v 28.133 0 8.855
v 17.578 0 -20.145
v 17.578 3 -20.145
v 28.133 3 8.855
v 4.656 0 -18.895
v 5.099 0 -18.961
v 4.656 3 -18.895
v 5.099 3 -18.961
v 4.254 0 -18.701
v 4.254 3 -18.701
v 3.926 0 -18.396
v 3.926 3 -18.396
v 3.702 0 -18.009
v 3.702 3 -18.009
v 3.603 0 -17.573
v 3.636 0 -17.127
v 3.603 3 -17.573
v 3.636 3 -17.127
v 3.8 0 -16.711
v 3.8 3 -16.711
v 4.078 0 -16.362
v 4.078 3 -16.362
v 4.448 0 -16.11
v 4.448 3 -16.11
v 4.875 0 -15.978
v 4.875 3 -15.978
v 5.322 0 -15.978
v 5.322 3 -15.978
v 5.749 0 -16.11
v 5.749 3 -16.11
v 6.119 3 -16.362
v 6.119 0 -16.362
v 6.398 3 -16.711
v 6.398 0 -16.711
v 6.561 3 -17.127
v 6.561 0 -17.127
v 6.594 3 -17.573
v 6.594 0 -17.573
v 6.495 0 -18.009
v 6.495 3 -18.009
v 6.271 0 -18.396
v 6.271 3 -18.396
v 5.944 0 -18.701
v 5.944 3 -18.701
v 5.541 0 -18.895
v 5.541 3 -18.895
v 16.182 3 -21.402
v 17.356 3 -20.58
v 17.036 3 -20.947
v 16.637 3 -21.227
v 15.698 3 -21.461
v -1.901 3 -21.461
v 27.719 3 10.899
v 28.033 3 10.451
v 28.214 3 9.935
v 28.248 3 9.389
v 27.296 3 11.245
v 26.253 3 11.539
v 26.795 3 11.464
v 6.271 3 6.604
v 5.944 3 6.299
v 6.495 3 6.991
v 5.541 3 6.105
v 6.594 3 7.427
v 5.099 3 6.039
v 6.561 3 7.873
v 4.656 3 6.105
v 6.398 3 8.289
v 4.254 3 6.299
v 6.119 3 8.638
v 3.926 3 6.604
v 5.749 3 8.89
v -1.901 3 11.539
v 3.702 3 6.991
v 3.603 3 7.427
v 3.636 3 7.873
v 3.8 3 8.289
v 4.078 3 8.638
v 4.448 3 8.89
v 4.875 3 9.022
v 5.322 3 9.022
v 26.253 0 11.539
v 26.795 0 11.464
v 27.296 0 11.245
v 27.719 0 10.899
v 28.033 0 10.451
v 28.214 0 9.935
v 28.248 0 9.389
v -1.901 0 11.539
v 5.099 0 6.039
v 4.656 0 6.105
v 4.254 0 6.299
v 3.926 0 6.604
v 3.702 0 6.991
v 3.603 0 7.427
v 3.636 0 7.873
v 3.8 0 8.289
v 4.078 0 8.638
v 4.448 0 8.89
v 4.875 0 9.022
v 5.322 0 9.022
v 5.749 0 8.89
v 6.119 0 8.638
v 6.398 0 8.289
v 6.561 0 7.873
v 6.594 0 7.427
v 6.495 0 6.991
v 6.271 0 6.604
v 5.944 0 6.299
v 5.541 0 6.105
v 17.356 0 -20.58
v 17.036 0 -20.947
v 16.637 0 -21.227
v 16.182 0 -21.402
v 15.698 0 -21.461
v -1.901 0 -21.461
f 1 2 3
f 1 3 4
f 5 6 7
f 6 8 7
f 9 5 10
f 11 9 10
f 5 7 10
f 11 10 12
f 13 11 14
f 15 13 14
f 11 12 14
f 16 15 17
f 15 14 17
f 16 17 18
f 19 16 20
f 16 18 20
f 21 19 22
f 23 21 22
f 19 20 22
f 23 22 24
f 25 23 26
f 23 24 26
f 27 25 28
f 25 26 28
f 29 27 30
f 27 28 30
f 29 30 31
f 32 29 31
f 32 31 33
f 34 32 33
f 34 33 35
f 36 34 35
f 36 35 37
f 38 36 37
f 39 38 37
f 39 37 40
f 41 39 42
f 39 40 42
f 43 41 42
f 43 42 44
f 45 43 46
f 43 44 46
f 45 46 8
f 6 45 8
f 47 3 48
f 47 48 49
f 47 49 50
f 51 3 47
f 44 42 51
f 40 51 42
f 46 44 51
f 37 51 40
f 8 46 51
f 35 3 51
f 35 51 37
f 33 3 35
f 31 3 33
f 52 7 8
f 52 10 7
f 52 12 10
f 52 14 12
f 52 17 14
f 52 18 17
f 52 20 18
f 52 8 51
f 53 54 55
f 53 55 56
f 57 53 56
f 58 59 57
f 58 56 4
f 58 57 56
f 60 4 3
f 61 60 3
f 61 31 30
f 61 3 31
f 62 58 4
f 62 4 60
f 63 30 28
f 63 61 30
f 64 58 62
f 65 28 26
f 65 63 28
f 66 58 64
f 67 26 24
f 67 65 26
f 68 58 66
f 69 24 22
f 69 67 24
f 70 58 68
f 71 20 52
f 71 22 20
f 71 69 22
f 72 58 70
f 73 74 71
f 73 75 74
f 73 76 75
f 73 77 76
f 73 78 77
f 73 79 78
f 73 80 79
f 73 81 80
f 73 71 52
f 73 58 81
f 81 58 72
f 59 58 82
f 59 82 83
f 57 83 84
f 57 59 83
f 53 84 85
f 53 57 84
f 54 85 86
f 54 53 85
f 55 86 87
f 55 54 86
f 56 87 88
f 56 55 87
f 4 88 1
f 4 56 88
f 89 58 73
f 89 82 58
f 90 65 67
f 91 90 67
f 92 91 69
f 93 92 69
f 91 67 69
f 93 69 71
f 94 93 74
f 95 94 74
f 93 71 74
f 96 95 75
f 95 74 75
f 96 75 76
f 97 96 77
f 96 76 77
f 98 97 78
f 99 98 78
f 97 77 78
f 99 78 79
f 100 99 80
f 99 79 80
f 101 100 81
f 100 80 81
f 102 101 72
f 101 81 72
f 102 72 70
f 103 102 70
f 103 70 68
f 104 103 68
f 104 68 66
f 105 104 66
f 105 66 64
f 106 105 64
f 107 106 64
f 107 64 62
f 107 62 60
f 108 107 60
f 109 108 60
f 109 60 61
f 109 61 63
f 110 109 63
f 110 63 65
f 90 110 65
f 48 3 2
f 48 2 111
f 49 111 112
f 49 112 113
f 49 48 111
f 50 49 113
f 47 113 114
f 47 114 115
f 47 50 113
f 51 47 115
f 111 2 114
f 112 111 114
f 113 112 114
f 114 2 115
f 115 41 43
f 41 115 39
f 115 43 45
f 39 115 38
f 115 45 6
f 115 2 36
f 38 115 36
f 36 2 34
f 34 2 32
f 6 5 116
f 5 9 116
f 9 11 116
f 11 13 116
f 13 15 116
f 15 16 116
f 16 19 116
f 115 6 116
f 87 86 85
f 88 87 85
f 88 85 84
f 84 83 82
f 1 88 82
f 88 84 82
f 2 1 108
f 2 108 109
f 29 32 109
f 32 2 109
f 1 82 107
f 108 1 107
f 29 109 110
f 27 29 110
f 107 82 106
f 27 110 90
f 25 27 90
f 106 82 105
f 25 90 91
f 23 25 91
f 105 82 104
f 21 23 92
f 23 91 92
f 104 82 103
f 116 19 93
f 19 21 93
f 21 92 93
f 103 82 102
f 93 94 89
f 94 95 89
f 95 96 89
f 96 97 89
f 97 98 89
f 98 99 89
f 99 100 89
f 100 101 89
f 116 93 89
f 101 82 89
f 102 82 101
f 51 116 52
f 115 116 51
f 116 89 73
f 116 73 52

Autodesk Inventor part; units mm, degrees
ref_plane "YZ Plane" through (0, 0, 0) normal (1, 0, 0) x (0, 1, 0)
ref_plane "XZ Plane" through (0, 0, 0) normal (0, 1, 0) x (-1, 0, 0)
ref_plane "XY Plane" through (0, 0, 0) normal (0, 0, 1) x (1, 0, 0)
sketch "Sketch1" plane through (0, 0, 0) normal (0, 1, 0) x (-1, 0, 0)
  line L0 (1.9014, 11.5388) -> (1.9014, -21.4612)
  line L1 (1.9014, -21.4612) -> (-17.0986, -21.4612)
  line L2 (-17.0986, -21.4612) -> (-29.1096, 11.5388)
  line L3 (-29.1096, 11.5388) -> (1.9014, 11.5388)
  line L4 (-17.0986, -21.4612) -> (-17.0986, 11.5388) construction
  point P0 (0, 0)
  dimension "d1" = 33
  dimension "d2" = 20
  dimension "d22" = 19
extrude "Extrusion1" add sketch "Sketch1" along normal blind 3
sketch "Sketch3" plane through (0, 0, 0) normal (0, -1, 0) x (1, 0, 0)
  line L0 (29.1096, 11.5388) -> (-1.9014, 11.5388) projected
  line L1 (-1.9014, 11.5388) -> (-1.9014, -21.4612) projected
  line L2 (-1.9014, -21.4612) -> (17.0986, -21.4612) projected
  point P0 (0, 0)
  point P1 (5.0986, 7.5388)
  point P2 (5.0986, -17.4612)
  dimension "d5" = 4
  dimension "d6" = 4
  dimension "d19" = 7
  dimension "d21" = 7
hole "Hole1" at (5.0986, 0, 7.5388) at (5.0986, 0, -17.4612) direction (0, 1, 0) diameter 3 end through all
fillet "Fillet1" radius 2 1 edges at (29.1096, 1.5, 11.5388)
fillet "Fillet2" radius 2 1 edges at (17.0986, 1.5, -21.4612)
equation "\"d6\" = d5"
equation "\"d21\" = d19"
properties part number "k2_feet"
